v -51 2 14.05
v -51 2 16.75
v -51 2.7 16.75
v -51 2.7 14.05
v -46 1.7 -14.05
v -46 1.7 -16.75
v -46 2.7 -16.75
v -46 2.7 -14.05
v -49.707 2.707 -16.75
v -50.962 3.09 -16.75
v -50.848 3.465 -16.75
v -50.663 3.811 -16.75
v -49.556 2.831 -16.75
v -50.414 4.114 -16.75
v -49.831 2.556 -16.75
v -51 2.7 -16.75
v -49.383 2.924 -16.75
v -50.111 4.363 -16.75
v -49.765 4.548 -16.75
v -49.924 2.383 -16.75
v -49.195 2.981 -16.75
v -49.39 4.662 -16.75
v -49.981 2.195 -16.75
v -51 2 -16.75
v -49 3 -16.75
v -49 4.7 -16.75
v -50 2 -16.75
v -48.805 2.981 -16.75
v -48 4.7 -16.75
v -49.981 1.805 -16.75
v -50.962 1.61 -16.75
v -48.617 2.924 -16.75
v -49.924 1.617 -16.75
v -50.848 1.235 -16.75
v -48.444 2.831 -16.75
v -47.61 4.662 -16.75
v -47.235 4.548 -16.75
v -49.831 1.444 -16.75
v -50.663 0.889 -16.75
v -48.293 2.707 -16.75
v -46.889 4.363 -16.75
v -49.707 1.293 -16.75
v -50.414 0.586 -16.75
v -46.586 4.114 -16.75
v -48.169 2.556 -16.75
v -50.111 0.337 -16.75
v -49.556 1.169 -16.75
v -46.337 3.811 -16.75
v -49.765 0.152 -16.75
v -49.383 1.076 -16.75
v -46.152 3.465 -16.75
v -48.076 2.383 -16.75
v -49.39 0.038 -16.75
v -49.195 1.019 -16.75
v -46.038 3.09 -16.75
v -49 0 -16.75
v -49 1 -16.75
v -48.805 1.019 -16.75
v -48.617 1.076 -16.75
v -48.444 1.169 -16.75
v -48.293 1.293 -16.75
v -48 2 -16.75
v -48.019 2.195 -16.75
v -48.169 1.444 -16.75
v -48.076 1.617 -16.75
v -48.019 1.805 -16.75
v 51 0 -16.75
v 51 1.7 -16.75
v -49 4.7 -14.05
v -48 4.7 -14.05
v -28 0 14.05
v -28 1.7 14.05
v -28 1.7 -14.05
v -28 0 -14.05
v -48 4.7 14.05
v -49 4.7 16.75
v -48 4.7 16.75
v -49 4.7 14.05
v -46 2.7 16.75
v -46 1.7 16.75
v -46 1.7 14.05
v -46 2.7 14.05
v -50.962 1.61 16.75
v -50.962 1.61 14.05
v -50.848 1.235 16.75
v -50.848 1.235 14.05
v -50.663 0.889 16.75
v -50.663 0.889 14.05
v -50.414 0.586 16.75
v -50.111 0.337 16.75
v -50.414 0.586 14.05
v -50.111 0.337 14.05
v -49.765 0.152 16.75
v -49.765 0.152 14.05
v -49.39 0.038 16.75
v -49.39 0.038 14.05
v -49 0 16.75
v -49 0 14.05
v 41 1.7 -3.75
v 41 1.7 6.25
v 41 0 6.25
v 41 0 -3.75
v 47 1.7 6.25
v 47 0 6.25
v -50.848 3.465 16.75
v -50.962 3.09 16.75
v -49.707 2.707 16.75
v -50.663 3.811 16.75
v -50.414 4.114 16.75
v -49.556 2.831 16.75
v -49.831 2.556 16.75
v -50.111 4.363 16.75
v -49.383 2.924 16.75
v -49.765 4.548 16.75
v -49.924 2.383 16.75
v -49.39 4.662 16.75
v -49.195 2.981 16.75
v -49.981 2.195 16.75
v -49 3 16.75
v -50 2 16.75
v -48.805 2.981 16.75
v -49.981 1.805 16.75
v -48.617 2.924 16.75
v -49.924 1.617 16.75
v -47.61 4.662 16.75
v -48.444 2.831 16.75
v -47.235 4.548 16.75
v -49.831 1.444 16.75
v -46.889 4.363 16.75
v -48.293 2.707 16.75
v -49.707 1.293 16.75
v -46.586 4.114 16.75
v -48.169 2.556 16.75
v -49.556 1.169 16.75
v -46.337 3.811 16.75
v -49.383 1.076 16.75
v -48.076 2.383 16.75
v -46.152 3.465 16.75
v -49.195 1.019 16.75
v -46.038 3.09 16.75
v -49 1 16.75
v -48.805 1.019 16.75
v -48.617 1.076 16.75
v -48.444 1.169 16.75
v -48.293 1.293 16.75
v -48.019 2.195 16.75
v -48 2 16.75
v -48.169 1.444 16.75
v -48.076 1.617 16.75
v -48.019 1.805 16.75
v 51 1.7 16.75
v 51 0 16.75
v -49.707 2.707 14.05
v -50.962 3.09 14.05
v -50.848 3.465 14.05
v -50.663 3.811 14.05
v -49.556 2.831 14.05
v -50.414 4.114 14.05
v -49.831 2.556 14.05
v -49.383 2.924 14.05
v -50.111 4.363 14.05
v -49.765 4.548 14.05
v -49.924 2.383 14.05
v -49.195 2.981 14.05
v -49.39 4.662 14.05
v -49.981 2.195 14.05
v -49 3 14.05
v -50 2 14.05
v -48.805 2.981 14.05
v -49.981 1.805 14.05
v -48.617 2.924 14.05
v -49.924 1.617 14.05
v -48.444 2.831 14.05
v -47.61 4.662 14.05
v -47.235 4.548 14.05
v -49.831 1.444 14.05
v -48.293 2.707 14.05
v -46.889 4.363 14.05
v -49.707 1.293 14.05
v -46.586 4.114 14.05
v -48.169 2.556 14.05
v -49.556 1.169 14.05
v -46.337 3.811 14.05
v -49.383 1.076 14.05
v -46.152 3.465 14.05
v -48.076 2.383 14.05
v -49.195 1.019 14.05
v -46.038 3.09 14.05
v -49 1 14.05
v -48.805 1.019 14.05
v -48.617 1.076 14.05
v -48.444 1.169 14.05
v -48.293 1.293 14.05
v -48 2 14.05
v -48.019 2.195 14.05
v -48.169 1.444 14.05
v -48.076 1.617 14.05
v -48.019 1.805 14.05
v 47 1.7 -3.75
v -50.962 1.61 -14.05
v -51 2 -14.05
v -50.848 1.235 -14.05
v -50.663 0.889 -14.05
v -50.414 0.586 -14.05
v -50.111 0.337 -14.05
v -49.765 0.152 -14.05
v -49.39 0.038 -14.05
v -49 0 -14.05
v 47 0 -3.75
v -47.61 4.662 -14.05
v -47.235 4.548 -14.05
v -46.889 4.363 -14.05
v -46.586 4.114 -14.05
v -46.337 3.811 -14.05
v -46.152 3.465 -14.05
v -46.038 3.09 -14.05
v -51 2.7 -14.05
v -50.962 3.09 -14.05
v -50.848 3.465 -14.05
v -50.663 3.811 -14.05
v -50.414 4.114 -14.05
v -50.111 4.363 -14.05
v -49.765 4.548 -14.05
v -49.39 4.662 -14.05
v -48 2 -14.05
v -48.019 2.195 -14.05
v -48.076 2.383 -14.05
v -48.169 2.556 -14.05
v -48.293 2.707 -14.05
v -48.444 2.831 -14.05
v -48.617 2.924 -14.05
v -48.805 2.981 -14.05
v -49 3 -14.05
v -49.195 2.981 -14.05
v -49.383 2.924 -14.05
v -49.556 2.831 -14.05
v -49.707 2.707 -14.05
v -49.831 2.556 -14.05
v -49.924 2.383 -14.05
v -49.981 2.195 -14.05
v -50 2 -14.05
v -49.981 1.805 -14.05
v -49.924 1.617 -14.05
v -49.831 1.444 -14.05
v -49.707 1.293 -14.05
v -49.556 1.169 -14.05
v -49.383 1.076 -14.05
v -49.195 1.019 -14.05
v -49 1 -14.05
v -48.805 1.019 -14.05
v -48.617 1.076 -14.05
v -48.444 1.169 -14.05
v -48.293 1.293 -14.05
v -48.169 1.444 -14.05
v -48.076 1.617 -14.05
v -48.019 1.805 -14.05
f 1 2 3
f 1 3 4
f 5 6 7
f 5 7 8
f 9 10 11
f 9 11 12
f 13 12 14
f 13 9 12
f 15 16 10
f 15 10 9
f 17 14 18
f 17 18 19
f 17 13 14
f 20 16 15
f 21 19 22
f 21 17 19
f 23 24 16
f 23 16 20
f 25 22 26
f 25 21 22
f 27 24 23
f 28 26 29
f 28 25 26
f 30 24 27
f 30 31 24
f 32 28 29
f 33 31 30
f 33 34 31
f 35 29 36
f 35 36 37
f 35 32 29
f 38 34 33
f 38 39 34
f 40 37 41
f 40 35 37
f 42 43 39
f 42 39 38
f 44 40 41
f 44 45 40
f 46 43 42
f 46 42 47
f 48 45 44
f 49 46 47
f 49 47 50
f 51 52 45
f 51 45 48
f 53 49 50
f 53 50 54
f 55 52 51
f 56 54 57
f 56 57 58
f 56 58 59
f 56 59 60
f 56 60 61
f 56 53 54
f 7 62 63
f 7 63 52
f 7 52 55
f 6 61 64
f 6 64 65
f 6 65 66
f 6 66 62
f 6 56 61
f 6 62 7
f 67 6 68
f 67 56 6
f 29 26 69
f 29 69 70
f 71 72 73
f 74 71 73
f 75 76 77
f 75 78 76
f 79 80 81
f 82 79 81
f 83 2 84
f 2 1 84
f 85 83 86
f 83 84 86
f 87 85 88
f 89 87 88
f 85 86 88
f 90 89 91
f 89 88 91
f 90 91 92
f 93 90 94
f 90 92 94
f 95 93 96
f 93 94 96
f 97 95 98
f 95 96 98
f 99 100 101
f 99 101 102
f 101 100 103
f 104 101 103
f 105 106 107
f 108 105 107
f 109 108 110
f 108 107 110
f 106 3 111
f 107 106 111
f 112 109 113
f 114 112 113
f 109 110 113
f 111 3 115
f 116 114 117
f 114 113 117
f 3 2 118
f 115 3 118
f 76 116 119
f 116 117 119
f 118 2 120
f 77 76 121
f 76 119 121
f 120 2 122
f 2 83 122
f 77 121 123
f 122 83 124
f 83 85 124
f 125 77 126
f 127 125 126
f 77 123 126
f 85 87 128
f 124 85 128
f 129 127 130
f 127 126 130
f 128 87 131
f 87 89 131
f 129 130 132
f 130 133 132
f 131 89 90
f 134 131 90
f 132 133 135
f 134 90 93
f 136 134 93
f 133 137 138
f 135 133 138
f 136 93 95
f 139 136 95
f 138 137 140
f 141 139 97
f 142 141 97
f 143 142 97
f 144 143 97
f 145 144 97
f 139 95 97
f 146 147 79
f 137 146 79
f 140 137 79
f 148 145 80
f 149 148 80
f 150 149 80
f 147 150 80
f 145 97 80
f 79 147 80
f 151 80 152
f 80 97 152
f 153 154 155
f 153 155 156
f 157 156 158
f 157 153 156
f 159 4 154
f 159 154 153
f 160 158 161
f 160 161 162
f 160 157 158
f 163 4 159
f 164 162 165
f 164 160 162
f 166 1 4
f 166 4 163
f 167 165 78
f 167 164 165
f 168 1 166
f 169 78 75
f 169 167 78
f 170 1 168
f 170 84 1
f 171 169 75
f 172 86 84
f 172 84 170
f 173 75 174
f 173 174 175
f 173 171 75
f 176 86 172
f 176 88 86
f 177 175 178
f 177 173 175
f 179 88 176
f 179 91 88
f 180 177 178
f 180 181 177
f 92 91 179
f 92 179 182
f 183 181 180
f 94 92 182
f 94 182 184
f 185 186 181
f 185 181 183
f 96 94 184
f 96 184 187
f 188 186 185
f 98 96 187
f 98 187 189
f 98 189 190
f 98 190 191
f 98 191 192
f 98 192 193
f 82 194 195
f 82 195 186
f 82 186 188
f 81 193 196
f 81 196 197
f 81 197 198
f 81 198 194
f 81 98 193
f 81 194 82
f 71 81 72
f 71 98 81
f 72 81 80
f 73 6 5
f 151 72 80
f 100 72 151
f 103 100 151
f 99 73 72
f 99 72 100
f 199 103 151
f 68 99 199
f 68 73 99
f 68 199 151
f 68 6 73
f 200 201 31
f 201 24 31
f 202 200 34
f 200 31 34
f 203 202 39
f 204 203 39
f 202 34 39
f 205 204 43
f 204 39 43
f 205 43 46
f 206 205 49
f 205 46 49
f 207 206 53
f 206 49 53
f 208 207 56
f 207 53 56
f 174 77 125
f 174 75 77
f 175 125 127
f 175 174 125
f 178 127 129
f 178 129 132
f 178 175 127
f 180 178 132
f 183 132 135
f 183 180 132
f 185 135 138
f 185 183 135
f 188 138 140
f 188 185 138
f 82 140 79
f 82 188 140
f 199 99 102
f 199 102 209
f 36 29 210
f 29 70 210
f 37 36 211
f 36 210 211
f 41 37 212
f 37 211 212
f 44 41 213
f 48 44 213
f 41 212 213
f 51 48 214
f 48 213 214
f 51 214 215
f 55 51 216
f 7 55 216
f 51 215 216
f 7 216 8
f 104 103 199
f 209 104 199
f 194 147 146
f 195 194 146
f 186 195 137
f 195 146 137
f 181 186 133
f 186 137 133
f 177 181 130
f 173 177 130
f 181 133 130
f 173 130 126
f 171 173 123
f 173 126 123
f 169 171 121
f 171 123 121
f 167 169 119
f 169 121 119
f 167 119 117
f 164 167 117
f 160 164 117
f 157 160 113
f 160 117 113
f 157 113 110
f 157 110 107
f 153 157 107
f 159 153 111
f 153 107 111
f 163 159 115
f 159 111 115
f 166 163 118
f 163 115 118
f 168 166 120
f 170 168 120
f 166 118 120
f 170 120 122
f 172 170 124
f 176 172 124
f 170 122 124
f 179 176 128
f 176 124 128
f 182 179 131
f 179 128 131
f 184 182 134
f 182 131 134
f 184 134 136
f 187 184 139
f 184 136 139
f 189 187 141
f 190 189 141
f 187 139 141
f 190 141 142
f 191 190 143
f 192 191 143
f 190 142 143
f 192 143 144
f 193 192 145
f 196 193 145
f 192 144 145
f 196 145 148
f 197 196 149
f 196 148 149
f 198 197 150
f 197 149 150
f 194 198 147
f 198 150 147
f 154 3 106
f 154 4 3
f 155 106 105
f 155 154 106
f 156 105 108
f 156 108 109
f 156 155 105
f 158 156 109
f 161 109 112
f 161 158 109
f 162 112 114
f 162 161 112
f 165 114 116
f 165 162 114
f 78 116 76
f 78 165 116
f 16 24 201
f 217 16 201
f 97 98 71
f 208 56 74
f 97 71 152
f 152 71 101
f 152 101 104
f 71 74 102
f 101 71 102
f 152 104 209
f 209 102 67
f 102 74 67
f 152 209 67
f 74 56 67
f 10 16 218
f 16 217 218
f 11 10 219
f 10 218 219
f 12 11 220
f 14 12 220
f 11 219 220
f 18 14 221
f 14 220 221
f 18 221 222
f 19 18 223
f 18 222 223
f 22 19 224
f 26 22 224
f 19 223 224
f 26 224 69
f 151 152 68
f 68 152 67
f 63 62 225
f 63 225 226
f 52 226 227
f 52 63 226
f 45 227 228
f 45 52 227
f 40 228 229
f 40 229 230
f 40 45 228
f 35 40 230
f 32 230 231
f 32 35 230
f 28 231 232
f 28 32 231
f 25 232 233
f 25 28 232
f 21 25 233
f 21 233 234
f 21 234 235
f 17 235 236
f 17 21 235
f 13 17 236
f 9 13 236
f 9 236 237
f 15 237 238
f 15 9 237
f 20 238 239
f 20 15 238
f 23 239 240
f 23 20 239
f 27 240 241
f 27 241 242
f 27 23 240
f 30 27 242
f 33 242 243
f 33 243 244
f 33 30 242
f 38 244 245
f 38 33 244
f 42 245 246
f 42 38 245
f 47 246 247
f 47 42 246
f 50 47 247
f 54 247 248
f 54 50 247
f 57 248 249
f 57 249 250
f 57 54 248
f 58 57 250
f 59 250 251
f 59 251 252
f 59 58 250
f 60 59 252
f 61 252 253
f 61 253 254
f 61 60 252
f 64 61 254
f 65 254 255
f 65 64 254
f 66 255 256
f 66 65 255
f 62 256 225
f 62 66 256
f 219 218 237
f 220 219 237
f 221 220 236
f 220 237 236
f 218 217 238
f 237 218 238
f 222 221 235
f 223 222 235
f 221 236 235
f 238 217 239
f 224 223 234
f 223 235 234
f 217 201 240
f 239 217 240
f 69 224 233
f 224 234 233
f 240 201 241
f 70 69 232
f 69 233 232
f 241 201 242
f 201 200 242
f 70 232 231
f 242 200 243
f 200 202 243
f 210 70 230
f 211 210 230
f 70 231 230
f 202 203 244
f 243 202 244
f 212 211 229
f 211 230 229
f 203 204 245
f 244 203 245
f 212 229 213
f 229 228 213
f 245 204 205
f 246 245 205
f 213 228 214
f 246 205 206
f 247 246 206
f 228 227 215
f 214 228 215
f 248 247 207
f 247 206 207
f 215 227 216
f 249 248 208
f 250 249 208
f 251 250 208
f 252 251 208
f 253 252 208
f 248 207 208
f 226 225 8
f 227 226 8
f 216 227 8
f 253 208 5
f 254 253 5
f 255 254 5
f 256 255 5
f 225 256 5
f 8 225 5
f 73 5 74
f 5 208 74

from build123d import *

# Parameters (mm, degrees)
SKETCH1_W            = 102
SKETCH1_H            = 33.5
BOSS_EXTRUDE1_DEPTH  = 1.7
SKETCH2_W            = 23
SKETCH2_H            = 28.1
CUT_EXTRUDE1_DEPTH   = 1.7
SKETCH4_W            = 5
SKETCH4_H            = 2.7
BOSS_EXTRUDE2_DEPTH  = 3
SKETCH5_R            = 1
CUT_EXTRUDE2_DEPTH   = 2.7
FILLET1_R            = 2
FILLET1_OF_MIRROR2_R = 2
SKETCH10_W           = 6
SKETCH10_H           = 10
CUT_EXTRUDE3_DEPTH   = 1.7


with BuildPart() as part:
    # Sketch1 → Boss-Extrude1 (new body)
    with BuildSketch(Plane(origin=(0, 0, 0), x_dir=(1, 0, 0), z_dir=(0, 1, 0))):
        Rectangle(SKETCH1_W, SKETCH1_H)
    extrude(amount=BOSS_EXTRUDE1_DEPTH)

    # Sketch2 → Cut-Extrude1 (cut)
    with BuildSketch(Plane(origin=(0, 1.7, 0), x_dir=(1, 0, 0), z_dir=(0, 1, 0))):
        with Locations((-39.5, 0)):
            Rectangle(SKETCH2_W, SKETCH2_H)
    extrude(amount=-CUT_EXTRUDE1_DEPTH, mode=Mode.SUBTRACT)

    # Sketch4 → Boss-Extrude2 (add)
    with BuildSketch(Plane(origin=(0, 1.7, 0), x_dir=(1, 0, 0), z_dir=(0, 1, 0))):
        with Locations((-48.5, -15.4)):
            Rectangle(SKETCH4_W, SKETCH4_H)
    boss_extrude2 = extrude(amount=BOSS_EXTRUDE2_DEPTH)

    # Sketch5 → Cut-Extrude2 (cut)
    with BuildSketch(Plane.XY.offset(16.75)):
        with Locations((-49, 2)):
            Circle(SKETCH5_R)
    cut_extrude2 = extrude(amount=-CUT_EXTRUDE2_DEPTH, mode=Mode.SUBTRACT)

    # Fillet1
    fillet1_edges = [part.edges().sort_by_distance(p)[0] for p in [
        (-51, 0, 15.4),
        (-51, 4.7, 15.4),
        (-46, 4.7, 15.4),
    ]]
    fillet(fillet1_edges, radius=FILLET1_R)

    # Mirror2: Boss-Extrude2, Cut-Extrude2 across plane
    add(boss_extrude2.mirror(Plane.XY))
    add(cut_extrude2.mirror(Plane.XY), mode=Mode.SUBTRACT)

    # Fillet1 of Mirror2
    fillet1_of_mirror2_edges = [part.edges().sort_by_distance(p)[0] for p in [
        (-51, 0, -15.4),
        (-51, 4.7, -15.4),
        (-46, 4.7, -15.4),
    ]]
    fillet(fillet1_of_mirror2_edges, radius=FILLET1_OF_MIRROR2_R)

    # Sketch10 → Cut-Extrude3 (cut)
    with BuildSketch(Plane(origin=(0, 1.7, 0), x_dir=(1, 0, 0), z_dir=(0, 1, 0))):
        with Locations((44, -1.25)):
            Rectangle(SKETCH10_W, SKETCH10_H)
    extrude(amount=-CUT_EXTRUDE3_DEPTH, mode=Mode.SUBTRACT)


solid = part.part
